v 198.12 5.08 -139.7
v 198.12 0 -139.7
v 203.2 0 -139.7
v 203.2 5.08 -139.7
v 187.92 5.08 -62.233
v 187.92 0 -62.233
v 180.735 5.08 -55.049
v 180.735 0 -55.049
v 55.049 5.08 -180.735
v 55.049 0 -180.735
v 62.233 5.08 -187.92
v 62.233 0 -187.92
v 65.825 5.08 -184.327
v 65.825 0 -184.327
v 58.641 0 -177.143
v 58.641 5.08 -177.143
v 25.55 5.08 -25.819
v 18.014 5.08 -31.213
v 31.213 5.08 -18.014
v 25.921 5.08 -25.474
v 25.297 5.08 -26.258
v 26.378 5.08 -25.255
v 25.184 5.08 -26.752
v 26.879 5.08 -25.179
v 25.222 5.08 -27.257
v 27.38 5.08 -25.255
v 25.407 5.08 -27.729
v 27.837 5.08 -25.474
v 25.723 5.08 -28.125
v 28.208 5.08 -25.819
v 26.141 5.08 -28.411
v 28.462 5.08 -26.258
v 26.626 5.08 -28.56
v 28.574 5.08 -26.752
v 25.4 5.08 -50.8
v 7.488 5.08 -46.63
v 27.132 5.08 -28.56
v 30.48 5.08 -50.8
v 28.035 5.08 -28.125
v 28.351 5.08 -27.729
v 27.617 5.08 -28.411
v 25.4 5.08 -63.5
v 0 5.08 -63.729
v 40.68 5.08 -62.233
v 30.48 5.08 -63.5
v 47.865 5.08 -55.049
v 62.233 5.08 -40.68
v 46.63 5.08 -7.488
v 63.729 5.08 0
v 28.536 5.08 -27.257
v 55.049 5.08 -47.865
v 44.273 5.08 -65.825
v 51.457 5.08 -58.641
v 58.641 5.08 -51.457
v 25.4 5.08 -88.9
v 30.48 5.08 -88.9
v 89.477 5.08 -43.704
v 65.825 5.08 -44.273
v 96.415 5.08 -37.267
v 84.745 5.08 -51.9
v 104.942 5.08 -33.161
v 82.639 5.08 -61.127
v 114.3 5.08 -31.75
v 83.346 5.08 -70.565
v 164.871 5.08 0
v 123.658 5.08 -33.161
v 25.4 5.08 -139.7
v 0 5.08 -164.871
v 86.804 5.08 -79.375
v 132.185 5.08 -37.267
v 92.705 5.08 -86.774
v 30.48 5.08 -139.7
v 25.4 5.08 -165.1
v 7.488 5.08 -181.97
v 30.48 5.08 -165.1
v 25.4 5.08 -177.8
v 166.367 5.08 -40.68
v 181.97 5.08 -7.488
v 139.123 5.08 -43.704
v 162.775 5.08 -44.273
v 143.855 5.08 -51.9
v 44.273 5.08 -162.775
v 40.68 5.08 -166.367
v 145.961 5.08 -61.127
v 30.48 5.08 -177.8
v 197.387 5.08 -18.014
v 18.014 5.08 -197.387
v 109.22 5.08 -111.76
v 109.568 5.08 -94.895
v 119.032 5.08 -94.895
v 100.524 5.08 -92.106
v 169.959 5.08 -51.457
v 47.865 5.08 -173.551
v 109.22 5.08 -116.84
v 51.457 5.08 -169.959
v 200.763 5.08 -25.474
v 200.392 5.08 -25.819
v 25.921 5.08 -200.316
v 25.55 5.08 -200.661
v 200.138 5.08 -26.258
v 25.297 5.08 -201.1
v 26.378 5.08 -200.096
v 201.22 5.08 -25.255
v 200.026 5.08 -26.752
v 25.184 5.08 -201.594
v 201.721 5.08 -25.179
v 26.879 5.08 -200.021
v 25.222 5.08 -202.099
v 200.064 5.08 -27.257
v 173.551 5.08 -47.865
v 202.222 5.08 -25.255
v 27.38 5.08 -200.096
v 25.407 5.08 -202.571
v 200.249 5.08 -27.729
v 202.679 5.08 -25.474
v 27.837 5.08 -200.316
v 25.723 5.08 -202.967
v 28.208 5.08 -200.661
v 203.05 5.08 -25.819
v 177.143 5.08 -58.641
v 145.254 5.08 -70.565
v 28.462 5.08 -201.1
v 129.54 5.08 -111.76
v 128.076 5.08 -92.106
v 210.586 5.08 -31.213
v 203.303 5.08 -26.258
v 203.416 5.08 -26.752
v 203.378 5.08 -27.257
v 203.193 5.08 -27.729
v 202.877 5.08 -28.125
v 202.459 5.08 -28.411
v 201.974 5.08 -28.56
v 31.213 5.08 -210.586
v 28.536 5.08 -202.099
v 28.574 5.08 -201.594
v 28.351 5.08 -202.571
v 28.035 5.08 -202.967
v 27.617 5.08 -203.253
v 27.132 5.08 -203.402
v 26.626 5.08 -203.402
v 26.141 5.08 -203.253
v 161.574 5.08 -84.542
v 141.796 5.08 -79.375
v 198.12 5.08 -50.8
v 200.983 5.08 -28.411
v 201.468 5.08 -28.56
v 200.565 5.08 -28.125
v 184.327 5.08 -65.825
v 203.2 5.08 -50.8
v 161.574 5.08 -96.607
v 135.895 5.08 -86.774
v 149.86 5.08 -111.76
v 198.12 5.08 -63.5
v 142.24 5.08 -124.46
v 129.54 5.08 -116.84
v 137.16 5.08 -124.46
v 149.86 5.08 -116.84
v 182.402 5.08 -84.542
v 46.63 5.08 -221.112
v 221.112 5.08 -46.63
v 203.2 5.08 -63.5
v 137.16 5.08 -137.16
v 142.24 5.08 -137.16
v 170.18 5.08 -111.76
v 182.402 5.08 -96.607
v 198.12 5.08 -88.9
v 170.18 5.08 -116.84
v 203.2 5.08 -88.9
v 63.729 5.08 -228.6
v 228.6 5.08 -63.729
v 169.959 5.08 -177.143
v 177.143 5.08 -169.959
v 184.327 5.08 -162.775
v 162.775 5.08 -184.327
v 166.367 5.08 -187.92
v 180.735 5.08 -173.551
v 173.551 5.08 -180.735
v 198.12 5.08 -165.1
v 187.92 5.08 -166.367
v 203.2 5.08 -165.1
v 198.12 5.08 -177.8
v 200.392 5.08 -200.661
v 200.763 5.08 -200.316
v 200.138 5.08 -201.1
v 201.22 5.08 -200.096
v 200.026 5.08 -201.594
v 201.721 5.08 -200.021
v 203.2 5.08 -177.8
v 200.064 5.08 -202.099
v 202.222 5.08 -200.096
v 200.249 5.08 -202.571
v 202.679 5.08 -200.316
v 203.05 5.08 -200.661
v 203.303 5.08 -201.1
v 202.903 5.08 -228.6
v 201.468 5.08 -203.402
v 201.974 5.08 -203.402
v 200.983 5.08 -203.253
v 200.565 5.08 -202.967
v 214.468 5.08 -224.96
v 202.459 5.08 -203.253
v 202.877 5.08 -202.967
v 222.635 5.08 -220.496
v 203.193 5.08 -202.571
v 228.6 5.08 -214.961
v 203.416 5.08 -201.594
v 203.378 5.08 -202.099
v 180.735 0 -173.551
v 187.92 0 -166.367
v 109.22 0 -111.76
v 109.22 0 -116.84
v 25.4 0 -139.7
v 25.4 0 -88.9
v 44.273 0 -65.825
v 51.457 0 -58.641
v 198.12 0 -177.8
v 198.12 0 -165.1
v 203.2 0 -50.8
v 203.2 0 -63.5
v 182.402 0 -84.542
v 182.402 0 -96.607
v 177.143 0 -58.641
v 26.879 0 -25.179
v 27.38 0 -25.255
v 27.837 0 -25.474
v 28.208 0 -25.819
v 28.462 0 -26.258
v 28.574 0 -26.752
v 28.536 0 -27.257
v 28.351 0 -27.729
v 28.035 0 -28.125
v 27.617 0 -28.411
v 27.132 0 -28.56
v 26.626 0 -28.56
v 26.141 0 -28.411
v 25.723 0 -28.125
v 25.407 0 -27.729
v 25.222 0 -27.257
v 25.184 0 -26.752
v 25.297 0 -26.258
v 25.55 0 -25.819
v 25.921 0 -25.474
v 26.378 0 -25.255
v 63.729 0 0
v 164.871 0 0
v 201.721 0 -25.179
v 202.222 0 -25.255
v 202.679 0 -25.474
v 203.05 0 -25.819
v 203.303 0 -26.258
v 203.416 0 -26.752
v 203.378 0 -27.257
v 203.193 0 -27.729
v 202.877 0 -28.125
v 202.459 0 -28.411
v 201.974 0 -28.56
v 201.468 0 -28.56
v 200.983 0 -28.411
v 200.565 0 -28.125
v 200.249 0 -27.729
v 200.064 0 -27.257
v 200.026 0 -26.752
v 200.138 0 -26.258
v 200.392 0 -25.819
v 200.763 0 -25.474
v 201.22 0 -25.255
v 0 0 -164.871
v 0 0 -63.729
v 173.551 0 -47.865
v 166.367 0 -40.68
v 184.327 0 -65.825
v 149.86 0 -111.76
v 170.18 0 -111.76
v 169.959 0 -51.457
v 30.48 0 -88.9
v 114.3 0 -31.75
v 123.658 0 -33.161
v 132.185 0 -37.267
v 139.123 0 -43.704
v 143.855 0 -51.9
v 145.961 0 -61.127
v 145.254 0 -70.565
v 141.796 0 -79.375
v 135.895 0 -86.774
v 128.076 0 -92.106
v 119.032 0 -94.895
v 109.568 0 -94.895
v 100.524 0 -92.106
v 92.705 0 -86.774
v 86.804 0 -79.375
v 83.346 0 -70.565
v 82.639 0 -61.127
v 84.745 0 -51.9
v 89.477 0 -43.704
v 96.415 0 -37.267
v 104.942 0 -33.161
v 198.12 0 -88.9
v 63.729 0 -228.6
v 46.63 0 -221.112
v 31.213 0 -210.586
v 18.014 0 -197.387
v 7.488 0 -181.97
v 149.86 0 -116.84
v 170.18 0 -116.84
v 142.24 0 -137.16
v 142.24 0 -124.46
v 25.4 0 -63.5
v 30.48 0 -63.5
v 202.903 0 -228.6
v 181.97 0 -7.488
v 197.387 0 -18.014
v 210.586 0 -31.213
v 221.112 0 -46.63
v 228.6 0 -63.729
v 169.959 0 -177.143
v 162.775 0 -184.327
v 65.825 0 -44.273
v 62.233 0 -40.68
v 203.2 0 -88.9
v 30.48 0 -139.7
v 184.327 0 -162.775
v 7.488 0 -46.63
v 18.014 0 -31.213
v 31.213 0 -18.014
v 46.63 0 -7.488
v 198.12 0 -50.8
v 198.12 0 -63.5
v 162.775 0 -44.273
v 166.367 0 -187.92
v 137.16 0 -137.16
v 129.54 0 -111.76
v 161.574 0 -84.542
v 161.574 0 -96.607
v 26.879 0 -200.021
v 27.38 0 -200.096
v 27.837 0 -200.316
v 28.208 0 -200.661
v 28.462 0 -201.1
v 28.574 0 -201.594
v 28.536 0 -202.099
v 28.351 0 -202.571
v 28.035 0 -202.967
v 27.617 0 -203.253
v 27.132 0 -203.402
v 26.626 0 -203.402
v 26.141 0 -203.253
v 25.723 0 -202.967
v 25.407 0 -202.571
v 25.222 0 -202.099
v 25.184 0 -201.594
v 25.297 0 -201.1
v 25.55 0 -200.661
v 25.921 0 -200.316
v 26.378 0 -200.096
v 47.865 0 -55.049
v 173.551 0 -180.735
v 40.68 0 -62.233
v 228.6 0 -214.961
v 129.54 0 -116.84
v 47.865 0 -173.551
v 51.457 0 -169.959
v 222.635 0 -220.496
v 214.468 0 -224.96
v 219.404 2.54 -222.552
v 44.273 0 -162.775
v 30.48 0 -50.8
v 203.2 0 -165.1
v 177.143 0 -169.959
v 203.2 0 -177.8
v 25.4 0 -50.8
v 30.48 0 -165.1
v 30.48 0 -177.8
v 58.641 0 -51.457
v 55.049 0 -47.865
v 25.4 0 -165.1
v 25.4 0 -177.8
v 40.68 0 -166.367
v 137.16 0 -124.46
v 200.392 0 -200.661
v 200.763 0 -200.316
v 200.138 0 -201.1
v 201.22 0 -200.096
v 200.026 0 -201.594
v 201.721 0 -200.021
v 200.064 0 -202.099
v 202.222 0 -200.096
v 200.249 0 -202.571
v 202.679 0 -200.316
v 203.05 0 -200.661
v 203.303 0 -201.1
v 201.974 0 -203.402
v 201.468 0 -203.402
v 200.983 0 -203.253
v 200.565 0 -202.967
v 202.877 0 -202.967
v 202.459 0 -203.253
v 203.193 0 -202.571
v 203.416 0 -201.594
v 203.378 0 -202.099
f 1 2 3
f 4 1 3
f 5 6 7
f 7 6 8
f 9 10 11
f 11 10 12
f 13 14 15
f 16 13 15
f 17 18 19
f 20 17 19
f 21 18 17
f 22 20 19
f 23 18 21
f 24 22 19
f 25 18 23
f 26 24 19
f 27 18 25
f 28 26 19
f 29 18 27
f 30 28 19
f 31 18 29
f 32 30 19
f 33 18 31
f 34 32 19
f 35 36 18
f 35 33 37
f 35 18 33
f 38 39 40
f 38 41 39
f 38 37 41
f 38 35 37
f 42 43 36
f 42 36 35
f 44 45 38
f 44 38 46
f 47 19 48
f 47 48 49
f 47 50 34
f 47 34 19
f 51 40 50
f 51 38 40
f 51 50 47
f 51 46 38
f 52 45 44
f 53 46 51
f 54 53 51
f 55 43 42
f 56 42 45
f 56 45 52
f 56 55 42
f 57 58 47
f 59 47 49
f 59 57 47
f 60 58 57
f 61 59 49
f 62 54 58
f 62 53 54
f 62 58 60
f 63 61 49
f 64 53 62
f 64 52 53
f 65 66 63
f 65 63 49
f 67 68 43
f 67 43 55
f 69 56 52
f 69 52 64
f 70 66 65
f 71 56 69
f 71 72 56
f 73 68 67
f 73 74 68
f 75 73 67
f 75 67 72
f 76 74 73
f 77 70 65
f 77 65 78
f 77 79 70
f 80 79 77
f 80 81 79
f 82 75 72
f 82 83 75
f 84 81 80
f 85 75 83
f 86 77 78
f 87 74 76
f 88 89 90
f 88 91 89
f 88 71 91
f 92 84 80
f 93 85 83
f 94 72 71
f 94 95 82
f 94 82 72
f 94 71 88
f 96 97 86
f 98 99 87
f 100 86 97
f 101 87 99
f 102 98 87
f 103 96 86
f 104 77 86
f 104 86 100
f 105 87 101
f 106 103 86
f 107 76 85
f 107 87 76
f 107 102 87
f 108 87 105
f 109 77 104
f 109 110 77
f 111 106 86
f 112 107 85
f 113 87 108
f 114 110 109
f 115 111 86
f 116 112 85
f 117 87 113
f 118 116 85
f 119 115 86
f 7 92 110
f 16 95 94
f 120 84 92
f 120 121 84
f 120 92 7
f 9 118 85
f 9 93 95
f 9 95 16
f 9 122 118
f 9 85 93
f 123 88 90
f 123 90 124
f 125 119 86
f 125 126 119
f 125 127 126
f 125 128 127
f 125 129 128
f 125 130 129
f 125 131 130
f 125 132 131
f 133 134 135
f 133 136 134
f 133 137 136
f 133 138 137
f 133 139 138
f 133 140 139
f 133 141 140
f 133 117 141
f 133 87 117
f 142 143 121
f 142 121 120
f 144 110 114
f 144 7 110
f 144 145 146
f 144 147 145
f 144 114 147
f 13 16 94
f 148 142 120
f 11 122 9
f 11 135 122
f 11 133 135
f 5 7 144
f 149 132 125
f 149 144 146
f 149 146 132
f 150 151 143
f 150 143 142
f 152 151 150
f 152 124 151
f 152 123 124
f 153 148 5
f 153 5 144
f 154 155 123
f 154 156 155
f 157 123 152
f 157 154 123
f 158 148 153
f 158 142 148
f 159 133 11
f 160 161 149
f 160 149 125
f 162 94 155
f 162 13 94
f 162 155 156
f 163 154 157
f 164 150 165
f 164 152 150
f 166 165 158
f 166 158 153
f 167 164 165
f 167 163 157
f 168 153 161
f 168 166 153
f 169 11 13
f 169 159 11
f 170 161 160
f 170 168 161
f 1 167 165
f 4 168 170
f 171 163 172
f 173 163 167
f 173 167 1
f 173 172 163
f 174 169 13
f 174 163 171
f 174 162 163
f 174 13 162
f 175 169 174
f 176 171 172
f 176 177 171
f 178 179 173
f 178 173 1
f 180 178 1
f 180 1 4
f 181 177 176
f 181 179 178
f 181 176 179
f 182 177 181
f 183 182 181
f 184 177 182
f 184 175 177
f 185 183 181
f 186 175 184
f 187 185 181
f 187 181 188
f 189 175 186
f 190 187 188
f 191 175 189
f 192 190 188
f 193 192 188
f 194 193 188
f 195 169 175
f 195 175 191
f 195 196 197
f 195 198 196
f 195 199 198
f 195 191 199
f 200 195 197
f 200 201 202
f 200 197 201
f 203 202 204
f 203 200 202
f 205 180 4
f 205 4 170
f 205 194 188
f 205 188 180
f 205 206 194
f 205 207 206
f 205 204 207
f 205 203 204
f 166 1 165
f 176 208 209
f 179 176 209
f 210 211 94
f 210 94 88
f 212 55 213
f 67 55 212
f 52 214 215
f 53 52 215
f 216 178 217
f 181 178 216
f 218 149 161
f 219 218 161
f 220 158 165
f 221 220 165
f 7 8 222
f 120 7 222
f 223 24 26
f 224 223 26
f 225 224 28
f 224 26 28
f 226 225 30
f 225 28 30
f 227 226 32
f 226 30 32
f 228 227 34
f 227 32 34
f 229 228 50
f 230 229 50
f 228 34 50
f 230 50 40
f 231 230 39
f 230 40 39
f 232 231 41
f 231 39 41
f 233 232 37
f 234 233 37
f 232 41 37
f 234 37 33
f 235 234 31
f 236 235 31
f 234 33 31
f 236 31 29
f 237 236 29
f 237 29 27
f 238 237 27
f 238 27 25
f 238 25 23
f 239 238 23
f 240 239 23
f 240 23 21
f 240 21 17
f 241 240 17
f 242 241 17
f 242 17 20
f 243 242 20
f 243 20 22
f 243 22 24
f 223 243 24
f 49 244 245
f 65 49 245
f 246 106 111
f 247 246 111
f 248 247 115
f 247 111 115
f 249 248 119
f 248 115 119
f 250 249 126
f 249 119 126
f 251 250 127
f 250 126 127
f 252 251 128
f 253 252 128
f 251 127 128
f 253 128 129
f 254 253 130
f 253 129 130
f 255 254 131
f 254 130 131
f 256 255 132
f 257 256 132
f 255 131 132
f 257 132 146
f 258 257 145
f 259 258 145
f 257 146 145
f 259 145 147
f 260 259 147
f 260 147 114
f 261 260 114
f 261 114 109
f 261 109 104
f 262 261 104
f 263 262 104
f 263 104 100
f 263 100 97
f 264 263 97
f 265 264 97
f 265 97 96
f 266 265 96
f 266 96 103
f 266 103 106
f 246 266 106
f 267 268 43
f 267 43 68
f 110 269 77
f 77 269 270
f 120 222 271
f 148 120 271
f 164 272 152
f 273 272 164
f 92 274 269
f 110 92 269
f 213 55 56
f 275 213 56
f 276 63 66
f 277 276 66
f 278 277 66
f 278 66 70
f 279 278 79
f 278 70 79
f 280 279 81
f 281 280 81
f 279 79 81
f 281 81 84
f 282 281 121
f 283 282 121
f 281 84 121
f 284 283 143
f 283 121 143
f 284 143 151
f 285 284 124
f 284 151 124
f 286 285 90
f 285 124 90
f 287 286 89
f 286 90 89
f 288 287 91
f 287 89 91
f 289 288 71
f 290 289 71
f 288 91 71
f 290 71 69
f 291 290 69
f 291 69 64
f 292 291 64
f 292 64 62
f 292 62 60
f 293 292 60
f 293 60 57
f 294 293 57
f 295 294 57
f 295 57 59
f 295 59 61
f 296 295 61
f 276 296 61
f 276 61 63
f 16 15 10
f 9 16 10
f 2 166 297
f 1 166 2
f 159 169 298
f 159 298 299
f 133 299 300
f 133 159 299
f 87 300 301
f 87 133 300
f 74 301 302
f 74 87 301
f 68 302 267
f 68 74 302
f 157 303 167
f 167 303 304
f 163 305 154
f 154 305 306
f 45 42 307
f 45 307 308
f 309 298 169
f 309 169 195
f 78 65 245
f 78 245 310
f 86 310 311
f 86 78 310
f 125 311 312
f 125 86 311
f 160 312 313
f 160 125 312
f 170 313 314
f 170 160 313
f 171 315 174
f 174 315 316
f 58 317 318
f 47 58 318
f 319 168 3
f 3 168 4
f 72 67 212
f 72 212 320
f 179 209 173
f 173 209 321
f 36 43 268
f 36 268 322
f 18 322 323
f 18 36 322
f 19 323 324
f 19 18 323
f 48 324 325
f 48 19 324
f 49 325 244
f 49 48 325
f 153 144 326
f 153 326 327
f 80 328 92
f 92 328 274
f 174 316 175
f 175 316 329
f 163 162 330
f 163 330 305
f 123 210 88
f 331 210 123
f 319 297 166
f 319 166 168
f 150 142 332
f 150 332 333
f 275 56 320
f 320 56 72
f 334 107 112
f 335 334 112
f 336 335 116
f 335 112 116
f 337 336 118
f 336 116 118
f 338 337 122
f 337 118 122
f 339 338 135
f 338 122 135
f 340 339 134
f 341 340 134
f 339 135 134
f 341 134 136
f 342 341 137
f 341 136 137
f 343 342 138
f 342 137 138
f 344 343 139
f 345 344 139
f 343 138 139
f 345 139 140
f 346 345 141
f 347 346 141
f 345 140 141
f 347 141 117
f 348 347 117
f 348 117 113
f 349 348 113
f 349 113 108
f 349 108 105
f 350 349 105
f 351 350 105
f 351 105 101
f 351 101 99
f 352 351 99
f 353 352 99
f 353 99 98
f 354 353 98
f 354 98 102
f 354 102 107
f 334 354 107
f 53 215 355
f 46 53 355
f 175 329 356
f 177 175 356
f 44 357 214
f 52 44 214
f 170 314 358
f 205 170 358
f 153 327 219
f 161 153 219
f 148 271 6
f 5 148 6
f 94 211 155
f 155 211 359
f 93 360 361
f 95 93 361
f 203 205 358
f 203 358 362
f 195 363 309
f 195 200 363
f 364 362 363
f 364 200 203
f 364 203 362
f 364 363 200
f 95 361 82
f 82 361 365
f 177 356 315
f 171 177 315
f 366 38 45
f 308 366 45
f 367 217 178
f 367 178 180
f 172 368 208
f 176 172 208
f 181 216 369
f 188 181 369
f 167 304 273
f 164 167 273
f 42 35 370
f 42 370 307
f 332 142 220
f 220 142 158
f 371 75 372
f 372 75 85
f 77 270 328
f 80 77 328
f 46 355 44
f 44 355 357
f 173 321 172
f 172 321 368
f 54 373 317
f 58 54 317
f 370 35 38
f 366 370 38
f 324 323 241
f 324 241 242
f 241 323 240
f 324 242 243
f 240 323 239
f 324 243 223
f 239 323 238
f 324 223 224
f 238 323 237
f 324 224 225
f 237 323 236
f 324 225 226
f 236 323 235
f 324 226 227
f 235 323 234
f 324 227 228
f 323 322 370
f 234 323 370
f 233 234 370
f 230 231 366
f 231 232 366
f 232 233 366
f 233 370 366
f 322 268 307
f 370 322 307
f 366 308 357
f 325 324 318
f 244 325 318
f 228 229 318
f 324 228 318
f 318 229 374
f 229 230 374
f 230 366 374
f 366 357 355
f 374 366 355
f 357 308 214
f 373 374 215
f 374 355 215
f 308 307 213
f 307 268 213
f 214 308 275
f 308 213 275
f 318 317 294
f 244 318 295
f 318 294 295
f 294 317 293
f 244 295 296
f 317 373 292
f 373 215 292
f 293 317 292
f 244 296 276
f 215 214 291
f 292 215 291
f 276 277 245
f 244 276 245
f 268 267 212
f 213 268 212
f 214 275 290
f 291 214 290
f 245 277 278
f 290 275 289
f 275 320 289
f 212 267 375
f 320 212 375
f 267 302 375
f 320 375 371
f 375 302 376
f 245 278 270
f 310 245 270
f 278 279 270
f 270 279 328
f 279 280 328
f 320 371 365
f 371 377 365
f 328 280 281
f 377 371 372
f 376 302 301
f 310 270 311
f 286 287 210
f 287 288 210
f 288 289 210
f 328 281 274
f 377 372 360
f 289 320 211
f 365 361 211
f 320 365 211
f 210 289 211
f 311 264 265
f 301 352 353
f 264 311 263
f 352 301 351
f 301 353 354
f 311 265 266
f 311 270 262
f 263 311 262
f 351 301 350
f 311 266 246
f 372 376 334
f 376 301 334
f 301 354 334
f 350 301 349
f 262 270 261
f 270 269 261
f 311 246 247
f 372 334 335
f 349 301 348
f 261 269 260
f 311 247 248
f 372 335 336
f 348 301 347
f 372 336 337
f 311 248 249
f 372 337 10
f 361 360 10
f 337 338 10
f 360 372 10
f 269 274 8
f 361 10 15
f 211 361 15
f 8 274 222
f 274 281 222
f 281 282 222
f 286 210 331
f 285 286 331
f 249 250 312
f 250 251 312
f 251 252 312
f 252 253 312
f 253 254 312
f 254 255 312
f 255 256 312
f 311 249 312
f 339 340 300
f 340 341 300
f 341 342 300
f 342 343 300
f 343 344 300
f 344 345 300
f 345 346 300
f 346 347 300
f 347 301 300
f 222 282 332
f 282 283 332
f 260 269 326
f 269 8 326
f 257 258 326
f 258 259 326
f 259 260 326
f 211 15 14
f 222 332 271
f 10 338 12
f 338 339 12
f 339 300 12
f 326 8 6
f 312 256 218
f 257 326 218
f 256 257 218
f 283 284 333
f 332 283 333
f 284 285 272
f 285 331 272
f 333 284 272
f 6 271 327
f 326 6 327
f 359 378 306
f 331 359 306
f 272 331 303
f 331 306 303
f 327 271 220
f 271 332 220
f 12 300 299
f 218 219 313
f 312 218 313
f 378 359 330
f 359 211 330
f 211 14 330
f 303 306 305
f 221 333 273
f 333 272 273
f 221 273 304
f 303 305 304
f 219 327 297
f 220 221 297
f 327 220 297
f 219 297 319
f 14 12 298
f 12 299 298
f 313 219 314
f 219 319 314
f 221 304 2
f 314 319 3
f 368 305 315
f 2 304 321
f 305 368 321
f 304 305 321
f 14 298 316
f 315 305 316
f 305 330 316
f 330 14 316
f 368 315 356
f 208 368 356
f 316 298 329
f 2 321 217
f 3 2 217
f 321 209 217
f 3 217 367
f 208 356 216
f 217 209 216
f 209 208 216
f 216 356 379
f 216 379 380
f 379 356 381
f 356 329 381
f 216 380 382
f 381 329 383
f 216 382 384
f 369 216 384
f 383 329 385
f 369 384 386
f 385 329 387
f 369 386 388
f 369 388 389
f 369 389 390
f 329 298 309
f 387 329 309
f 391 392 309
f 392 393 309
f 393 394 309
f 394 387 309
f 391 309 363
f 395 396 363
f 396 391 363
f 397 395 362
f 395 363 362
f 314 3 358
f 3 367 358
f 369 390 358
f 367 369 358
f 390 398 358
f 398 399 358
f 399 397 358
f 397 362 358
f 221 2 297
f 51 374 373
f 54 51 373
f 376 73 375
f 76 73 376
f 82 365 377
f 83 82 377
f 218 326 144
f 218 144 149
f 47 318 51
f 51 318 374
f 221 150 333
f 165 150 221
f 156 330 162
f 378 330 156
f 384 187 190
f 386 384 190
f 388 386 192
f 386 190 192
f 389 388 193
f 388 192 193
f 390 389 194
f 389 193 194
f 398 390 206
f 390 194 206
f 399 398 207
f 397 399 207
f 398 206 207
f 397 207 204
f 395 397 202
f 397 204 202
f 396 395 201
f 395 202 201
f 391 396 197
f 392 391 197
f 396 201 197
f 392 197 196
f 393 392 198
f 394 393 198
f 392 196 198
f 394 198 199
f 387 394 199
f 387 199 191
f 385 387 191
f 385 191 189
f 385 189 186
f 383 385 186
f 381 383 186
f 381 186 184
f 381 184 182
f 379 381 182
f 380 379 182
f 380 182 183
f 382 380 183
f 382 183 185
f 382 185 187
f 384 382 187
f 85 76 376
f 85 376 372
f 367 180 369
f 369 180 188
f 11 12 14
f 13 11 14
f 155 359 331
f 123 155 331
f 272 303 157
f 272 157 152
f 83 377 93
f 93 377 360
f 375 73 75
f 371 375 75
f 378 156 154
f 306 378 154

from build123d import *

# Parameters (mm, degrees)
SKETCH1_W           = 228.6
SKETCH1_H           = 228.6
BOSS_EXTRUDE1_DEPTH = 5.08
CUT_EXTRUDE2_REACH  = 325.329
SKETCH9_W           = 5.08
SKETCH9_H           = 12.7
SKETCH9_H_2         = 50.8
CUT_EXTRUDE7_START  = -5.08
CUT_EXTRUDE7_DEPTH  = 5.08
CUT_EXTRUDE5_REACH  = 325.329
SKETCH13_R          = 1.7
CUT_EXTRUDE6_REACH  = 325.329
SKETCH16_W          = 5.08
SKETCH16_H          = 12.7
CUT_EXTRUDE8_DEPTH  = 324.329130287
SKETCH17_W          = 20.32
SKETCH17_H          = 5.08
CUT_EXTRUDE9_DEPTH  = 324.329130287
CUT_EXTRUDE10_REACH = 325.329
SKETCH18_R          = 31.75
CUT_EXTRUDE11_REACH = 325.329
SKETCH19_W          = 20.828
SKETCH19_H          = 12.065


# Read off the part's stored shape, not the designer's step: Cut-Extrude7
with BuildPart() as part:
    # Sketch1 → Boss-Extrude1 (new body)
    with BuildSketch(Plane(origin=(0, 0, 0), x_dir=(1, 0, 0), z_dir=(0, 1, 0))):
        with Locations((114.3, 114.3)):
            Rectangle(SKETCH1_W, SKETCH1_H)
    extrude(amount=BOSS_EXTRUDE1_DEPTH)

    # Sketch9 → Cut-Extrude2 (cut, up to next)
    with BuildSketch(Plane(origin=(0, 5.08, 0), x_dir=(1, 0, 0), z_dir=(0, 1, 0)), mode=Mode.PRIVATE) as cut_extrude2_sk1:
        with Locations((27.94, 57.15)):
            Rectangle(SKETCH9_W, SKETCH9_H)
    cut_extrude2_tool1 = extrude(cut_extrude2_sk1.sketch, amount=-CUT_EXTRUDE2_REACH, mode=Mode.PRIVATE) & part.part
    # Sketch9 → Cut-Extrude2 (cut, up to next)
    with BuildSketch(Plane(origin=(0, 5.08, 0), x_dir=(1, 0, 0), z_dir=(0, 1, 0)), mode=Mode.PRIVATE) as cut_extrude2_sk2:
        with Locations((27.94, 171.45)):
            Rectangle(SKETCH9_W, SKETCH9_H)
    cut_extrude2_tool2 = extrude(cut_extrude2_sk2.sketch, amount=-CUT_EXTRUDE2_REACH, mode=Mode.PRIVATE) & part.part
    # Sketch9 → Cut-Extrude2 (cut, up to next)
    with BuildSketch(Plane(origin=(0, 5.08, 0), x_dir=(1, 0, 0), z_dir=(0, 1, 0)), mode=Mode.PRIVATE) as cut_extrude2_sk3:
        with Locations((27.94, 114.3)):
            Rectangle(SKETCH9_W, SKETCH9_H_2)
    cut_extrude2_tool3 = extrude(cut_extrude2_sk3.sketch, amount=-CUT_EXTRUDE2_REACH, mode=Mode.PRIVATE) & part.part
    # Sketch9 → Cut-Extrude2 (cut, up to next)
    with BuildSketch(Plane(origin=(0, 5.08, 0), x_dir=(1, 0, 0), z_dir=(0, 1, 0)), mode=Mode.PRIVATE) as cut_extrude2_sk4:
        with Locations((200.66, 57.15)):
            Rectangle(SKETCH9_W, SKETCH9_H)
    cut_extrude2_tool4 = extrude(cut_extrude2_sk4.sketch, amount=-CUT_EXTRUDE2_REACH, mode=Mode.PRIVATE) & part.part
    # Sketch9 → Cut-Extrude2 (cut, up to next)
    with BuildSketch(Plane(origin=(0, 5.08, 0), x_dir=(1, 0, 0), z_dir=(0, 1, 0)), mode=Mode.PRIVATE) as cut_extrude2_sk5:
        with Locations((200.66, 171.45)):
            Rectangle(SKETCH9_W, SKETCH9_H)
    cut_extrude2_tool5 = extrude(cut_extrude2_sk5.sketch, amount=-CUT_EXTRUDE2_REACH, mode=Mode.PRIVATE) & part.part
    # Sketch9 → Cut-Extrude2 (cut, up to next)
    with BuildSketch(Plane(origin=(0, 5.08, 0), x_dir=(1, 0, 0), z_dir=(0, 1, 0)), mode=Mode.PRIVATE) as cut_extrude2_sk6:
        with Locations((200.66, 114.3)):
            Rectangle(SKETCH9_W, SKETCH9_H_2)
    cut_extrude2_tool6 = extrude(cut_extrude2_sk6.sketch, amount=-CUT_EXTRUDE2_REACH, mode=Mode.PRIVATE) & part.part
    add(cut_extrude2_tool1.solids().sort_by_distance((27.94, 5.08, -57.15))[0], mode=Mode.SUBTRACT)
    add(cut_extrude2_tool2.solids().sort_by_distance((27.94, 5.08, -171.45))[0], mode=Mode.SUBTRACT)
    add(cut_extrude2_tool3.solids().sort_by_distance((27.94, 5.08, -114.3))[0], mode=Mode.SUBTRACT)
    add(cut_extrude2_tool4.solids().sort_by_distance((200.66, 5.08, -57.15))[0], mode=Mode.SUBTRACT)
    add(cut_extrude2_tool5.solids().sort_by_distance((200.66, 5.08, -171.45))[0], mode=Mode.SUBTRACT)
    add(cut_extrude2_tool6.solids().sort_by_distance((200.66, 5.08, -114.3))[0], mode=Mode.SUBTRACT)

    # Cut-Extrude7 outline → Cut-Extrude7 (cut)
    with BuildSketch(Plane.XZ.offset(CUT_EXTRUDE7_START)):
        with BuildLine():
            Line((228.6, -228.6), (228.6, -214.96095324))
            add(Edge.make_bspline(
                [(228.6, -214.96095324), (228.271324847, -215.358272881), (226.828038088, -217.01632419), (224.012197717, -219.629547006), (219.578479693, -222.607192086), (214.100555872, -225.254763581), (208.4056249, -227.207942052), (204.348403214, -228.260486737), (202.903319092, -228.6)],
                knots=[0.418523599, 0.418523599, 0.418523599, 0.418523599, 0.4375, 0.5, 0.5625, 0.625, 0.6875, 0.719133593, 0.719133593, 0.719133593, 0.719133593], degree=3))
            Line((202.903319092, -228.6), (228.6, -228.6))
        make_face()
        with BuildLine():
            ThreePointArc((164.870571061, 0), (204.294023356, -24.305976644), (228.6, -63.729428939))
            Line((228.6, -63.729428939), (228.6, 0))
            Line((228.6, 0), (164.870571061, 0))
        make_face()
        with BuildLine():
            Line((0, -228.6), (63.729428939, -228.6))
            ThreePointArc((63.729428939, -228.6), (24.305976644, -204.294023356), (0, -164.870571061))
            Line((0, -164.870571061), (0, -228.6))
        make_face()
        with BuildLine():
            ThreePointArc((0, -63.729428939), (24.305976644, -24.305976644), (63.729428939, 0))
            Line((63.729428939, 0), (0, 0))
            Line((0, 0), (0, -63.729428939))
        make_face()
    extrude(amount=CUT_EXTRUDE7_DEPTH, mode=Mode.SUBTRACT)

    # Sketch13 → Cut-Extrude5 (cut, up to next)
    with BuildSketch(Plane(origin=(0, 5.08, 0), x_dir=(1, 0, 0), z_dir=(0, 1, 0)), mode=Mode.PRIVATE) as cut_extrude5_sk1:
        with Locations(Location((26.879075631, 26.879075631, 0), (0, 0, 270))):
            Circle(SKETCH13_R)
    cut_extrude5_tool1 = extrude(cut_extrude5_sk1.sketch, amount=-CUT_EXTRUDE5_REACH, mode=Mode.PRIVATE) & part.part
    # Sketch13 → Cut-Extrude5 (cut, up to next)
    with BuildSketch(Plane(origin=(0, 5.08, 0), x_dir=(1, 0, 0), z_dir=(0, 1, 0)), mode=Mode.PRIVATE) as cut_extrude5_sk2:
        with Locations(Location((201.720924369, 201.720924369, 0), (0, 0, 270))):
            Circle(SKETCH13_R)
    cut_extrude5_tool2 = extrude(cut_extrude5_sk2.sketch, amount=-CUT_EXTRUDE5_REACH, mode=Mode.PRIVATE) & part.part
    # Sketch13 → Cut-Extrude5 (cut, up to next)
    with BuildSketch(Plane(origin=(0, 5.08, 0), x_dir=(1, 0, 0), z_dir=(0, 1, 0)), mode=Mode.PRIVATE) as cut_extrude5_sk3:
        with Locations(Location((26.879075631, 201.720924369, 0), (0, 0, 270))):
            Circle(SKETCH13_R)
    cut_extrude5_tool3 = extrude(cut_extrude5_sk3.sketch, amount=-CUT_EXTRUDE5_REACH, mode=Mode.PRIVATE) & part.part
    # Sketch13 → Cut-Extrude5 (cut, up to next)
    with BuildSketch(Plane(origin=(0, 5.08, 0), x_dir=(1, 0, 0), z_dir=(0, 1, 0)), mode=Mode.PRIVATE) as cut_extrude5_sk4:
        with Locations(Location((201.720924369, 26.879075631, 0), (0, 0, 270))):
            Circle(SKETCH13_R)
    cut_extrude5_tool4 = extrude(cut_extrude5_sk4.sketch, amount=-CUT_EXTRUDE5_REACH, mode=Mode.PRIVATE) & part.part
    add(cut_extrude5_tool1.solids().sort_by_distance((26.879076, 5.08, -26.879076))[0], mode=Mode.SUBTRACT)
    add(cut_extrude5_tool2.solids().sort_by_distance((201.720924, 5.08, -201.720924))[0], mode=Mode.SUBTRACT)
    add(cut_extrude5_tool3.solids().sort_by_distance((26.879076, 5.08, -201.720924))[0], mode=Mode.SUBTRACT)
    add(cut_extrude5_tool4.solids().sort_by_distance((201.720924, 5.08, -26.879076))[0], mode=Mode.SUBTRACT)

    # Sketch14 → Cut-Extrude6 (cut, up to next)
    with BuildSketch(Plane.XZ, mode=Mode.PRIVATE) as cut_extrude6_sk1:
        Polygon((169.959013197, -177.143218094), (162.774808301, -184.327422991), (166.366910749, -187.91952544), (173.551115646, -180.735320543), align=None)
    cut_extrude6_tool1 = extrude(cut_extrude6_sk1.sketch, amount=-CUT_EXTRUDE6_REACH, mode=Mode.PRIVATE) & part.part
    # Sketch14 → Cut-Extrude6 (cut, up to next)
    with BuildSketch(Plane.XZ, mode=Mode.PRIVATE) as cut_extrude6_sk2:
        Polygon((184.327422991, -162.774808301), (177.143218094, -169.959013197), (180.735320543, -173.551115646), (187.91952544, -166.366910749), align=None)
    cut_extrude6_tool2 = extrude(cut_extrude6_sk2.sketch, amount=-CUT_EXTRUDE6_REACH, mode=Mode.PRIVATE) & part.part
    # Sketch14 → Cut-Extrude6 (cut, up to next)
    with BuildSketch(Plane.XZ, mode=Mode.PRIVATE) as cut_extrude6_sk3:
        Polygon((65.825191699, -184.327422991), (58.640986803, -177.143218094), (55.048884354, -180.735320543), (62.233089251, -187.91952544), align=None)
    cut_extrude6_tool3 = extrude(cut_extrude6_sk3.sketch, amount=-CUT_EXTRUDE6_REACH, mode=Mode.PRIVATE) & part.part
    # Sketch14 → Cut-Extrude6 (cut, up to next)
    with BuildSketch(Plane.XZ, mode=Mode.PRIVATE) as cut_extrude6_sk4:
        Polygon((51.456781906, -169.959013197), (44.272577009, -162.774808301), (40.68047456, -166.366910749), (47.864679457, -173.551115646), align=None)
    cut_extrude6_tool4 = extrude(cut_extrude6_sk4.sketch, amount=-CUT_EXTRUDE6_REACH, mode=Mode.PRIVATE) & part.part
    # Sketch14 → Cut-Extrude6 (cut, up to next)
    with BuildSketch(Plane.XZ, mode=Mode.PRIVATE) as cut_extrude6_sk5:
        Polygon((177.143218094, -58.640986803), (184.327422991, -65.825191699), (187.91952544, -62.233089251), (180.735320543, -55.048884354), align=None)
    cut_extrude6_tool5 = extrude(cut_extrude6_sk5.sketch, amount=-CUT_EXTRUDE6_REACH, mode=Mode.PRIVATE) & part.part
    # Sketch14 → Cut-Extrude6 (cut, up to next)
    with BuildSketch(Plane.XZ, mode=Mode.PRIVATE) as cut_extrude6_sk6:
        Polygon((162.774808301, -44.272577009), (169.959013197, -51.456781906), (173.551115646, -47.864679457), (166.366910749, -40.68047456), align=None)
    cut_extrude6_tool6 = extrude(cut_extrude6_sk6.sketch, amount=-CUT_EXTRUDE6_REACH, mode=Mode.PRIVATE) & part.part
    # Sketch14 → Cut-Extrude6 (cut, up to next)
    with BuildSketch(Plane.XZ, mode=Mode.PRIVATE) as cut_extrude6_sk7:
        Polygon((44.272577009, -65.825191699), (51.456781906, -58.640986803), (47.864679457, -55.048884354), (40.68047456, -62.233089251), align=None)
    cut_extrude6_tool7 = extrude(cut_extrude6_sk7.sketch, amount=-CUT_EXTRUDE6_REACH, mode=Mode.PRIVATE) & part.part
    # Sketch14 → Cut-Extrude6 (cut, up to next)
    with BuildSketch(Plane.XZ, mode=Mode.PRIVATE) as cut_extrude6_sk8:
        Polygon((58.640986803, -51.456781906), (65.825191699, -44.272577009), (62.233089251, -40.68047456), (55.048884354, -47.864679457), align=None)
    cut_extrude6_tool8 = extrude(cut_extrude6_sk8.sketch, amount=-CUT_EXTRUDE6_REACH, mode=Mode.PRIVATE) & part.part
    add(cut_extrude6_tool1.solids().sort_by_distance((168.162962, 0, -182.531372))[0], mode=Mode.SUBTRACT)
    add(cut_extrude6_tool2.solids().sort_by_distance((182.531372, 0, -168.162962))[0], mode=Mode.SUBTRACT)
    add(cut_extrude6_tool3.solids().sort_by_distance((60.437038, 0, -182.531372))[0], mode=Mode.SUBTRACT)
    add(cut_extrude6_tool4.solids().sort_by_distance((46.068628, 0, -168.162962))[0], mode=Mode.SUBTRACT)
    add(cut_extrude6_tool5.solids().sort_by_distance((182.531372, 0, -60.437038))[0], mode=Mode.SUBTRACT)
    add(cut_extrude6_tool6.solids().sort_by_distance((168.162962, 0, -46.068628))[0], mode=Mode.SUBTRACT)
    add(cut_extrude6_tool7.solids().sort_by_distance((46.068628, 0, -60.437038))[0], mode=Mode.SUBTRACT)
    add(cut_extrude6_tool8.solids().sort_by_distance((60.437038, 0, -46.068628))[0], mode=Mode.SUBTRACT)

    # Sketch16 → Cut-Extrude8 (cut, through all)
    with BuildSketch(Plane.XZ):
        with Locations((139.7, -130.81)):
            Rectangle(SKETCH16_W, SKETCH16_H)
    extrude(amount=-CUT_EXTRUDE8_DEPTH, mode=Mode.SUBTRACT)

    # Sketch17 → Cut-Extrude9 (cut, through all)
    with BuildSketch(Plane.XZ):
        with Locations((119.38, -114.3)):
            Rectangle(SKETCH17_W, SKETCH17_H)
        with Locations((160.02, -114.3)):
            Rectangle(SKETCH17_W, SKETCH17_H)
    extrude(amount=-CUT_EXTRUDE9_DEPTH, mode=Mode.SUBTRACT)

    # Sketch18 → Cut-Extrude10 (cut, up to next)
    with BuildSketch(Plane(origin=(0, 5.08, 0), x_dir=(1, 0, 0), z_dir=(0, 1, 0)), mode=Mode.PRIVATE) as cut_extrude10_sk1:
        with Locations(Location((114.3, 63.5, 0), (0, 0, 270))):
            Circle(SKETCH18_R)
    cut_extrude10_tool1 = extrude(cut_extrude10_sk1.sketch, amount=-CUT_EXTRUDE10_REACH, mode=Mode.PRIVATE) & part.part
    add(cut_extrude10_tool1.solids().sort_by_distance((114.3, 5.08, -63.5))[0], mode=Mode.SUBTRACT)

    # Sketch19 → Cut-Extrude11 (cut, up to next)
    with BuildSketch(Plane(origin=(0, 5.08, 0), x_dir=(1, 0, 0), z_dir=(0, 1, 0)), mode=Mode.PRIVATE) as cut_extrude11_sk1:
        with Locations((171.988363225, 90.574772783)):
            Rectangle(SKETCH19_W, SKETCH19_H)
    cut_extrude11_tool1 = extrude(cut_extrude11_sk1.sketch, amount=-CUT_EXTRUDE11_REACH, mode=Mode.PRIVATE) & part.part
    add(cut_extrude11_tool1.solids().sort_by_distance((171.988363, 5.08, -90.574773))[0], mode=Mode.SUBTRACT)


solid = part.part
